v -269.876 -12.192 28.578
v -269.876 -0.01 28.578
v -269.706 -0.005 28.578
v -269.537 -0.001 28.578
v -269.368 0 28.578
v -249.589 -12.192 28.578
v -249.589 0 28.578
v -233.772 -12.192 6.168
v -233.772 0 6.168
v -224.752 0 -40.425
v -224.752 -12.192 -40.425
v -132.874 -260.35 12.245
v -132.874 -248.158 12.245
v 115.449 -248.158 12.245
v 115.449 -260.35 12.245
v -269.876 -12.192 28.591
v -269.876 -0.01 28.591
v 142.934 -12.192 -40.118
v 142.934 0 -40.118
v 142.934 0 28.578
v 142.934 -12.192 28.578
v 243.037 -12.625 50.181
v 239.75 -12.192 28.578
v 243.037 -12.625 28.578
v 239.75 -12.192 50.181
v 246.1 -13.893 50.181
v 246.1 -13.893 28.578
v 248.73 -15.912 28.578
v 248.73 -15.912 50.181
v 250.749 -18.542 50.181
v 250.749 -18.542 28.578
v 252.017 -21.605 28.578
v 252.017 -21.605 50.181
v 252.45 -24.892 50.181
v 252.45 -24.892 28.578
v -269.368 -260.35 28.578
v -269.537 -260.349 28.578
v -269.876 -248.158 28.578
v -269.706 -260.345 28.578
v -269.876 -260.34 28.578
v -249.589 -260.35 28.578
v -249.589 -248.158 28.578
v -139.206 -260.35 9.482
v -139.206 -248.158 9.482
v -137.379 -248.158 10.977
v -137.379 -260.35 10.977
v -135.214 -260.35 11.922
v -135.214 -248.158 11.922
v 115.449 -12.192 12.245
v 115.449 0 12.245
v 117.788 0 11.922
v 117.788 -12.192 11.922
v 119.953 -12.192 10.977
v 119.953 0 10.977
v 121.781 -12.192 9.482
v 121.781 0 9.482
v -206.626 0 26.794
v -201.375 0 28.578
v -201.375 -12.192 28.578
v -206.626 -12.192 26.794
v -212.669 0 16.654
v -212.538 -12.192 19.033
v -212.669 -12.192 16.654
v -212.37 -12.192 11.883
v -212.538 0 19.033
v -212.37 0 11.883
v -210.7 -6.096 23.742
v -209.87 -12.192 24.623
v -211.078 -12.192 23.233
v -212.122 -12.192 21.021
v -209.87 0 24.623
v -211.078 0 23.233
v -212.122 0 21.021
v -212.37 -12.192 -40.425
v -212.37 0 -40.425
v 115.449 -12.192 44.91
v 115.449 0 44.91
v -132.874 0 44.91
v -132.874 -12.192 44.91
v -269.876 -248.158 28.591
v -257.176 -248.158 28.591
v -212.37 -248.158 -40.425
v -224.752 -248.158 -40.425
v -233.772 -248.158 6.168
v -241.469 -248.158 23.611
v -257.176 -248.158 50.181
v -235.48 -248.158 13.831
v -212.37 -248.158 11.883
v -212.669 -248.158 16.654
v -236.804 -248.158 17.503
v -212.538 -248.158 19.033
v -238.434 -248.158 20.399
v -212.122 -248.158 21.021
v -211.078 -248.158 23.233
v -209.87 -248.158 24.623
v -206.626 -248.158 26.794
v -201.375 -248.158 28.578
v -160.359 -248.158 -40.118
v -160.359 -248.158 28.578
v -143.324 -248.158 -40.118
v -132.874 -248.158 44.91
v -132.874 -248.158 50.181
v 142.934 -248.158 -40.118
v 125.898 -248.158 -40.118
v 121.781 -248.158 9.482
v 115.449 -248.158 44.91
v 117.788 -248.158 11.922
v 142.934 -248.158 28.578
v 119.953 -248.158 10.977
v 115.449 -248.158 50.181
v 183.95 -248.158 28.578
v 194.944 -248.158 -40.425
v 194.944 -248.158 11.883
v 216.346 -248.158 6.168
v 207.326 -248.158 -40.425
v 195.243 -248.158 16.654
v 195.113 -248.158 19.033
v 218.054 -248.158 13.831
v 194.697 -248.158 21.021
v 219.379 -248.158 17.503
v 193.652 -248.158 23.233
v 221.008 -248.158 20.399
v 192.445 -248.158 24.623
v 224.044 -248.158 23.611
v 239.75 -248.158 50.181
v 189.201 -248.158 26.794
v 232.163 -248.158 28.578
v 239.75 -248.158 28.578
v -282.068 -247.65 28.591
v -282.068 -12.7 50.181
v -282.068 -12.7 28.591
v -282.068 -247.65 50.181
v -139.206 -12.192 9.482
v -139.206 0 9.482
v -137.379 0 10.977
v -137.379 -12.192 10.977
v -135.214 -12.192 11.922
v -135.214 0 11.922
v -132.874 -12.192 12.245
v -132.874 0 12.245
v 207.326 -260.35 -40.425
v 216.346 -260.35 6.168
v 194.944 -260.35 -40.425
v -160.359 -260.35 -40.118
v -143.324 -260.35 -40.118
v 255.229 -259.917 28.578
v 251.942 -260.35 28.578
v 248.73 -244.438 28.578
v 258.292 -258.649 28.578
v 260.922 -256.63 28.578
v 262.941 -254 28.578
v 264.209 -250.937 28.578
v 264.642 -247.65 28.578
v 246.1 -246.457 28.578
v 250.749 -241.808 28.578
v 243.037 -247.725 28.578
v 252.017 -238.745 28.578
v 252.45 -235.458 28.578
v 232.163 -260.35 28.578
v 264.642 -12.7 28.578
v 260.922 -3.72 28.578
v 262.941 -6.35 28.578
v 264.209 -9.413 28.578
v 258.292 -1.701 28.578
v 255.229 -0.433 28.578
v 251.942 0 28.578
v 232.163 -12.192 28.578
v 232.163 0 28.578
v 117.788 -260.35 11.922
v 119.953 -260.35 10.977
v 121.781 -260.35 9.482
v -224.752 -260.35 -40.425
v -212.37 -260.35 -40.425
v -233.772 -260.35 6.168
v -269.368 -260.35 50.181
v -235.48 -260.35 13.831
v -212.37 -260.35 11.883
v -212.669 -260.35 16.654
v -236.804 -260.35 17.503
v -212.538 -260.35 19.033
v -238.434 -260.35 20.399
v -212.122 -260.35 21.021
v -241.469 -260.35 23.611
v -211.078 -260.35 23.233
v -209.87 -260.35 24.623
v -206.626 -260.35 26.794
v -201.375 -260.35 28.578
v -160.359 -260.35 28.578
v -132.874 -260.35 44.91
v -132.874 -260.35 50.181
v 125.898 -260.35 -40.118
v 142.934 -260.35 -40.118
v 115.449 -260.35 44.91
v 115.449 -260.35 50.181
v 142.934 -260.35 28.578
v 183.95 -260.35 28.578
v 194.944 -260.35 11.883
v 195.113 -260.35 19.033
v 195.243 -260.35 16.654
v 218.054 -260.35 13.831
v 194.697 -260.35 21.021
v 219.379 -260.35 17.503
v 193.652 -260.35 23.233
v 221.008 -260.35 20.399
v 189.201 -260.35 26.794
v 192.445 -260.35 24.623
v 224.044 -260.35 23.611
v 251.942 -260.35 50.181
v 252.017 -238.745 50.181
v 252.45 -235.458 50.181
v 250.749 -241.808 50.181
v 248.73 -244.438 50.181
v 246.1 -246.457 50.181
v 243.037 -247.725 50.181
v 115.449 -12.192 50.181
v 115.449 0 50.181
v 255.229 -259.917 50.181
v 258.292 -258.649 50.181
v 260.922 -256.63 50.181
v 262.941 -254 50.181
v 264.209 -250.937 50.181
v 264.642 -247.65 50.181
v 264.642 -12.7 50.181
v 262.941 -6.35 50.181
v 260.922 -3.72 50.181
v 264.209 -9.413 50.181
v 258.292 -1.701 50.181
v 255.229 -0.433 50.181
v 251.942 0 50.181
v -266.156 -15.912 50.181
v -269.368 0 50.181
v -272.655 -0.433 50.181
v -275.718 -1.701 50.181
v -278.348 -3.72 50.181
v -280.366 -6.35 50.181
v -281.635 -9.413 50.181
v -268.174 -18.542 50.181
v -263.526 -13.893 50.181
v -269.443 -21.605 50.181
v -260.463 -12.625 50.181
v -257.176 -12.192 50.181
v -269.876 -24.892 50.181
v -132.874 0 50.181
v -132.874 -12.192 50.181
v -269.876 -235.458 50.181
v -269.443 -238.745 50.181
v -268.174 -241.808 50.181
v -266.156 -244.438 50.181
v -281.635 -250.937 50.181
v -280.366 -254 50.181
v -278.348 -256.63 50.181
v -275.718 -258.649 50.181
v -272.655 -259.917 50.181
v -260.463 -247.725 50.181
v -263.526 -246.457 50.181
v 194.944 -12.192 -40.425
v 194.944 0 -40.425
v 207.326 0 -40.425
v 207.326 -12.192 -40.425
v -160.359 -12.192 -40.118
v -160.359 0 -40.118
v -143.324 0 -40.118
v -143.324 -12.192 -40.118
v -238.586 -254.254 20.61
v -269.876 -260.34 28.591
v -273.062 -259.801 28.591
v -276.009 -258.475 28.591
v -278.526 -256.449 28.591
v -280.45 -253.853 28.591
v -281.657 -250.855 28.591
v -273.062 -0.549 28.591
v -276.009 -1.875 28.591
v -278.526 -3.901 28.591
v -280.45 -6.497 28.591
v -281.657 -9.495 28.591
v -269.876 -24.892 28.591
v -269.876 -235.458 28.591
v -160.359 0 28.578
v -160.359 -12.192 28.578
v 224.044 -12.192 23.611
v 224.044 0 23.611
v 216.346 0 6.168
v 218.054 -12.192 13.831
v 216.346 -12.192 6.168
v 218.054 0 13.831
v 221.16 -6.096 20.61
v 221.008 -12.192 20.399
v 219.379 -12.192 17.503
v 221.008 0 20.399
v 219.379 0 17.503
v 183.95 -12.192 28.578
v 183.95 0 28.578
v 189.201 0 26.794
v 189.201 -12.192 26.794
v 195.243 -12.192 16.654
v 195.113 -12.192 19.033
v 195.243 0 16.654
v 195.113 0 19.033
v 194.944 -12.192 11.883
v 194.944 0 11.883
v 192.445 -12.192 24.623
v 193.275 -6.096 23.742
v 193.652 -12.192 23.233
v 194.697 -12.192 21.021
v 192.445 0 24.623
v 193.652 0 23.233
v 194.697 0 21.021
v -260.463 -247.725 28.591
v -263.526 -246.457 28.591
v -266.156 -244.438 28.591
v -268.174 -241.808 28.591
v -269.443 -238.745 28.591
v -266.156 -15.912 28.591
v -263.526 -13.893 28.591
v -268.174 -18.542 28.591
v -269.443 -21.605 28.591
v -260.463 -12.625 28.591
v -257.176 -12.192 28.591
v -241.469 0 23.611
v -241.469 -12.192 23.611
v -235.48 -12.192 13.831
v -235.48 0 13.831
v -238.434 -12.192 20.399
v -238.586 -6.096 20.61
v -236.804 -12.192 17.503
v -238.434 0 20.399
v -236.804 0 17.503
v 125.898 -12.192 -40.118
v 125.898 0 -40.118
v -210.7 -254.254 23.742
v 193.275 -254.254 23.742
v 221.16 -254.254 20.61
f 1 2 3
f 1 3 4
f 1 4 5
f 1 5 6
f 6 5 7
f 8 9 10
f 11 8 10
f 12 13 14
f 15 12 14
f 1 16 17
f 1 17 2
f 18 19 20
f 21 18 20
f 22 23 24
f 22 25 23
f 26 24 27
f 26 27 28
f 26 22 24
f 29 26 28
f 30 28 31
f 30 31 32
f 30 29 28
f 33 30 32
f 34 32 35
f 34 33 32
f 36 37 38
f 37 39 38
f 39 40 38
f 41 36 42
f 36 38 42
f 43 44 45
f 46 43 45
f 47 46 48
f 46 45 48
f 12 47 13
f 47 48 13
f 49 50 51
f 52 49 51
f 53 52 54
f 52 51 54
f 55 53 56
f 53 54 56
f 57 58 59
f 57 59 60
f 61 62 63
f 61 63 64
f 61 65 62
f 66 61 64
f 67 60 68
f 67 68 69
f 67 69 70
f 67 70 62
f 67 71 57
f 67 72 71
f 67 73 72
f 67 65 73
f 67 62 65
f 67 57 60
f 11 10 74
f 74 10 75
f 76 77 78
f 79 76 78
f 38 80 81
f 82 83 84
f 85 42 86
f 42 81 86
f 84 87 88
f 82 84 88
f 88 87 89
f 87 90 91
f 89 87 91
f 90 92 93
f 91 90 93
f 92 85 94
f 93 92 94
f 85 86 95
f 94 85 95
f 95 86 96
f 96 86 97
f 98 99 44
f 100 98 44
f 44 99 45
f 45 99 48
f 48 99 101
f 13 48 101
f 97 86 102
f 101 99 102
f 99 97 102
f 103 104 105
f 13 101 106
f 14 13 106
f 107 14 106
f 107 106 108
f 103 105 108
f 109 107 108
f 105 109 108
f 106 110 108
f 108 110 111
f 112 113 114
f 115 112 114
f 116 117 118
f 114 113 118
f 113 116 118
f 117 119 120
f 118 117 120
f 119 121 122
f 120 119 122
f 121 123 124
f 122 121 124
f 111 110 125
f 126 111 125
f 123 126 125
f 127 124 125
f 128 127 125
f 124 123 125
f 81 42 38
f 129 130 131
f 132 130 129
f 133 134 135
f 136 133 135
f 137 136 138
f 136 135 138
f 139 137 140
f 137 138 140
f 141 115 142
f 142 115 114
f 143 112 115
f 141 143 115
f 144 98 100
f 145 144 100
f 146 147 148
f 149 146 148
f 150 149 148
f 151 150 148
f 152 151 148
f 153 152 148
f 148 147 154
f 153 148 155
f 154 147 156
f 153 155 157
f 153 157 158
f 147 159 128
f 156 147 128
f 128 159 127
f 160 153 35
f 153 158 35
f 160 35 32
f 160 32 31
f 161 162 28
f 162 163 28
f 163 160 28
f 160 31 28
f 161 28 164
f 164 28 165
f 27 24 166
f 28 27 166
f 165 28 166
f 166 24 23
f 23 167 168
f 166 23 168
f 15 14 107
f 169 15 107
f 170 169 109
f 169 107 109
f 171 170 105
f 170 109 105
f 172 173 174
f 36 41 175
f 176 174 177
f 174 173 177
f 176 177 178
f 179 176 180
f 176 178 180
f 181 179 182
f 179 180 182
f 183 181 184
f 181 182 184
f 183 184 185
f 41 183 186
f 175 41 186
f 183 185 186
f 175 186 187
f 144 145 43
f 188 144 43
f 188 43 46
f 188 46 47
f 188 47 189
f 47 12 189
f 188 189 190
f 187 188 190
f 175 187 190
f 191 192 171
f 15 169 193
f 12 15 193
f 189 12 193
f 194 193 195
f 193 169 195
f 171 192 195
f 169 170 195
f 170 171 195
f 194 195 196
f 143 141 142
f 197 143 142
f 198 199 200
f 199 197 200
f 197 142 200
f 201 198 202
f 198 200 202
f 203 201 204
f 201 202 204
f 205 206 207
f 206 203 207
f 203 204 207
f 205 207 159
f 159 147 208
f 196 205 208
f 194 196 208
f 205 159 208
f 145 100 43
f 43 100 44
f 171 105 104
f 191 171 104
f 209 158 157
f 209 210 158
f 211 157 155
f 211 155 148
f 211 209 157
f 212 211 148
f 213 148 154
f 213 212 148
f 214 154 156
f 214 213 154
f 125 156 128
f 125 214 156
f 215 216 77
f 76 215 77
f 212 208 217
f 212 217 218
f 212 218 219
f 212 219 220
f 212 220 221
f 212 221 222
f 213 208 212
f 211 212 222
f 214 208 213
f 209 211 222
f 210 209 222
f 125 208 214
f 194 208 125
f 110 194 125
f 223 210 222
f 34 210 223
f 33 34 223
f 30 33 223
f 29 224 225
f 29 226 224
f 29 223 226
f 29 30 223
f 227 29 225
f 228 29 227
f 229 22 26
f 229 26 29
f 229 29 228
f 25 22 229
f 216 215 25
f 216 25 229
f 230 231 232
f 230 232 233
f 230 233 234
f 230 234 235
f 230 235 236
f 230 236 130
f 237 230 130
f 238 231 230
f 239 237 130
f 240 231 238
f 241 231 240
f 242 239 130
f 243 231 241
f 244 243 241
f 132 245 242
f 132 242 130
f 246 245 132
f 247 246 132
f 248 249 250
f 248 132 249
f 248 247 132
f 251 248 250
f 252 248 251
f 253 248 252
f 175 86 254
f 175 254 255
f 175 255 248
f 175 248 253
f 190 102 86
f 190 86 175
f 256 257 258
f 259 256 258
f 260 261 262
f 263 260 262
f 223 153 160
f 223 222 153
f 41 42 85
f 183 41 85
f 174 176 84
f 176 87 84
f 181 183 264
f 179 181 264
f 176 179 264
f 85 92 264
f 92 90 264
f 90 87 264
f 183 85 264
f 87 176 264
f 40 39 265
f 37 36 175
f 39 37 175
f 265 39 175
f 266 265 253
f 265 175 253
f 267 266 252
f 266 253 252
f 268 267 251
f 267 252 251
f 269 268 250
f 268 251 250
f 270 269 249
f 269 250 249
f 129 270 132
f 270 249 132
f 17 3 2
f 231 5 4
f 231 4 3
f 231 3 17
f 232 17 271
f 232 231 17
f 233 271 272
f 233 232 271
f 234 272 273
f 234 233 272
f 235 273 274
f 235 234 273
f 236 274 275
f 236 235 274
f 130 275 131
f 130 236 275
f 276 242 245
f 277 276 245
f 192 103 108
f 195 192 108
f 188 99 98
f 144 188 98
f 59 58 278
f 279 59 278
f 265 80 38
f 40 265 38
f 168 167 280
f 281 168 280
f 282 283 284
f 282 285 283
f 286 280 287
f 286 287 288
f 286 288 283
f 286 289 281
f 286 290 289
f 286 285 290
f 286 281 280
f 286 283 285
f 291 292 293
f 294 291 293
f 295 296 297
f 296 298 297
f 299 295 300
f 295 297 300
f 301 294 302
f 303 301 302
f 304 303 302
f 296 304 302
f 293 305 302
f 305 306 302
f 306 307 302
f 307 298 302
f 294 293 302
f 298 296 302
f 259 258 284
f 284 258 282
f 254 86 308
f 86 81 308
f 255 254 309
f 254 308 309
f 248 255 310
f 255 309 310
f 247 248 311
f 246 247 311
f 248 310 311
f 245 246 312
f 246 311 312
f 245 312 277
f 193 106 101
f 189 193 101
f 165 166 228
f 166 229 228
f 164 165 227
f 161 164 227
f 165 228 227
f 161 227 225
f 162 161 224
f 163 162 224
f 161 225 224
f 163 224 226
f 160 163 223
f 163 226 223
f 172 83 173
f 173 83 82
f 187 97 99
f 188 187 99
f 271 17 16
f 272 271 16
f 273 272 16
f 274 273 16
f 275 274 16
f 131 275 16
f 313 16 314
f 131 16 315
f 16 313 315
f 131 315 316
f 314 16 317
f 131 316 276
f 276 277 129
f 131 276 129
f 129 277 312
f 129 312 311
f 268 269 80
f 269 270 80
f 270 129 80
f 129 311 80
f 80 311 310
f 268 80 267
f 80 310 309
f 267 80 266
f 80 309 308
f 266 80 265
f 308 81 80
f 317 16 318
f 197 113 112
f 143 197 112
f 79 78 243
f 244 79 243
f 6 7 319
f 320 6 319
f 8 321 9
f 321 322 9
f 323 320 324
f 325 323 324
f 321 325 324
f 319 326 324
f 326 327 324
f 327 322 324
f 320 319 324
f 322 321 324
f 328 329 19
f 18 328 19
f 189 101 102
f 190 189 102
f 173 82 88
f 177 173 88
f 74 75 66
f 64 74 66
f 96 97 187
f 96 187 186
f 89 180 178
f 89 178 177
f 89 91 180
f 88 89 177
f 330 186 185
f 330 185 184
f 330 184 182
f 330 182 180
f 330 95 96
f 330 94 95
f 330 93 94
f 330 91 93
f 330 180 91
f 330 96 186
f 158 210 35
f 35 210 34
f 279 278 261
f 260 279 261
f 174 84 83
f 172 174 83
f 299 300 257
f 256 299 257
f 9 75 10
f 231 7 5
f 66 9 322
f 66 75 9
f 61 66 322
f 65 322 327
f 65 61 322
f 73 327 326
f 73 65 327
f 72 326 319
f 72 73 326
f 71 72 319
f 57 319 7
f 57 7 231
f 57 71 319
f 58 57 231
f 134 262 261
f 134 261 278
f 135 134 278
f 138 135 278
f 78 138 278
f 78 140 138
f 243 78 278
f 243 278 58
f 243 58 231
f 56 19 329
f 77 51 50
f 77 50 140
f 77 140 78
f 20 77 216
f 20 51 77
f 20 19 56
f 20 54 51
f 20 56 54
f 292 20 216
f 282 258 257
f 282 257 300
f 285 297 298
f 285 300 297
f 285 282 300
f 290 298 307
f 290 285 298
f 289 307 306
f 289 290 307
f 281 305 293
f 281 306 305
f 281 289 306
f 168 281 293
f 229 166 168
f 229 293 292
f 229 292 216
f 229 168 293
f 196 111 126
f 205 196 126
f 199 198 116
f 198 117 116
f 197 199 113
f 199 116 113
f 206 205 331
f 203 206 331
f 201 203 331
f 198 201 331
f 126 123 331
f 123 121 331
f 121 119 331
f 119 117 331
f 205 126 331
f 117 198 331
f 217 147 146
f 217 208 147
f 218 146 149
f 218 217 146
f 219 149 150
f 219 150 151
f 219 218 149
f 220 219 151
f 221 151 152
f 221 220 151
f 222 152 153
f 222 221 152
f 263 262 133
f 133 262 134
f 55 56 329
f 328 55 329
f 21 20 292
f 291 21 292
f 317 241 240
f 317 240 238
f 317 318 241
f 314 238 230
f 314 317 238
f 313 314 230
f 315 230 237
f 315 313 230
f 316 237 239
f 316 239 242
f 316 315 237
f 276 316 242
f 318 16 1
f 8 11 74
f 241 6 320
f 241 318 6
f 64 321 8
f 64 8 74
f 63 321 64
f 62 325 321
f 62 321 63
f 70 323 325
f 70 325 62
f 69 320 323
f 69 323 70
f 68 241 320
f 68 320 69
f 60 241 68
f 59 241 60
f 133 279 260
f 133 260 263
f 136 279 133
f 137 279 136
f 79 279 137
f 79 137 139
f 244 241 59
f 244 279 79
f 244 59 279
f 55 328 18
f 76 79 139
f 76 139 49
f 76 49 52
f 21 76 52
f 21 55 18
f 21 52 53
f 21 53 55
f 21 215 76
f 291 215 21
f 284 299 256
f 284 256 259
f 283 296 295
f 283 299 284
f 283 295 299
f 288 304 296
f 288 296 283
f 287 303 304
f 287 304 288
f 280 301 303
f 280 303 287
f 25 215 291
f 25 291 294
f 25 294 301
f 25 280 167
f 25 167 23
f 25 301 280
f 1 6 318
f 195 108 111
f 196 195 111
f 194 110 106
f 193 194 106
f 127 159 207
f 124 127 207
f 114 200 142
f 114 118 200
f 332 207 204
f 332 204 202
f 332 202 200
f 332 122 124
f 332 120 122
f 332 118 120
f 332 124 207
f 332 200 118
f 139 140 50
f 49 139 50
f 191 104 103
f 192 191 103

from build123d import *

# Parameters (mm, degrees)
F1_DEPTH = 12.192
F3_W     = 260.35
F3_H     = 21.6032387971
F4_DEPTH = 12.192
F5_W     = 260.35
F5_H     = 21.59
F6_DEPTH = 12.192
F7_R     = 12.7


with BuildPart() as f1:
    # F0 (on Front) → F1 (new body)
    with BuildSketch(Plane.XZ):
        Polygon((115.4489097687, 44.9104134451), (-8.7127741426, 44.9104134451), (-8.7127741426, 12.2448502547), (115.4489097687, 12.2448502547), (115.4489097687, 28.5776318499), align=None)
        with BuildLine():
            add(Edge.make_bspline(
                [(-201.3751125628, 28.5776318499), (-203.6036875056, 28.2155507261), (-213.5160050083, 24.8398299044), (-212.7768922816, 16.2961456434), (-212.3699930733, 11.8833564186)],
                knots=[0.1713367735, 0.1713367735, 0.1713367735, 0.1713367735, 0.5720981619, 1, 1, 1, 1], degree=3))
            Line((-201.3751125628, 28.5776318499), (-249.5887362649, 28.5776318499))
            add(Edge.make_bspline(
                [(-249.5887362649, 28.5776318499), (-245.3983662499, 26.3811930315), (-236.7722226078, 21.8596837899), (-234.7906912251, 11.49704289), (-233.7717394185, 6.1683199847)],
                knots=[0, 0, 0, 0, 0.4857755898, 1, 1, 1, 1], degree=3))
            Line((-233.7717394185, 6.1683199847), (-224.7518429065, -40.4246754655))
            Line((-224.7518429065, -40.4246754655), (-212.3699930733, -40.4246754655))
            Line((-212.3699930733, -40.4246754655), (-212.3699930733, 11.8833564186))
        make_face()
        with BuildLine():
            add(Edge.make_bspline(
                [(232.1631879797, 28.5776318499), (227.9728179646, 26.3811930315), (219.3466743226, 21.8596837899), (217.3651429399, 11.49704289), (216.3461911332, 6.1683199847)],
                knots=[0, 0, 0, 0, 0.4857755898, 1, 1, 1, 1], degree=3))
            Line((232.1631879797, 28.5776318499), (183.9495642776, 28.5776318499))
            add(Edge.make_bspline(
                [(183.9495642776, 28.5776318499), (186.1781392203, 28.2155507261), (196.0904567231, 24.8398299044), (195.3513439963, 16.2961456434), (194.944444788, 11.8833564186)],
                knots=[0.1713367735, 0.1713367735, 0.1713367735, 0.1713367735, 0.5720981619, 1, 1, 1, 1], degree=3))
            Line((194.944444788, 11.8833564186), (194.944444788, -40.4246754655))
            Line((194.944444788, -40.4246754655), (207.3262946213, -40.4246754655))
            Line((207.3262946213, -40.4246754655), (216.3461911332, 6.1683199847))
        make_face()
        with BuildLine():
            Line((-132.874458054, 12.2448502547), (-132.874458054, 28.5776318499))
            Line((-132.874458054, 28.5776318499), (-160.3592138582, 28.5776318499))
            Line((-160.3592138582, 28.5776318499), (-160.3592138582, -40.1182342476))
            Line((-160.3592138582, -40.1182342476), (-143.3239786863, -40.1182342476))
            Line((-143.3239786863, -40.1182342476), (-139.2062762381, 9.481767078))
            ThreePointArc((-139.2062762381, 9.481767078), (-136.3286783046, 11.5239959202), (-132.874458054, 12.2448502547))
        make_face()
        with BuildLine():
            Line((115.4489097687, 28.5776318499), (115.4489097687, 12.2448502547))
            ThreePointArc((115.4489097687, 12.2448502547), (118.9031300193, 11.5239959202), (121.7807279529, 9.481767078))
            Line((121.7807279529, 9.481767078), (125.898430401, -40.1182342476))
            Line((125.898430401, -40.1182342476), (142.933665573, -40.1182342476))
            Line((142.933665573, -40.1182342476), (142.933665573, 28.5776318499))
            Line((142.933665573, 28.5776318499), (115.4489097687, 28.5776318499))
        make_face()
        with BuildLine():
            Line((115.4489097687, 50.180870647), (115.4489097687, 44.9104134451))
            Line((115.4489097687, 44.9104134451), (115.4489097687, 28.5776318499))
            Line((115.4489097687, 28.5776318499), (142.933665573, 28.5776318499))
            Line((142.933665573, 28.5776318499), (182.0295738914, 28.5776318499))
            add(Edge.make_bspline(
                [(182.0295738914, 28.5776318499), (182.5128861487, 28.6550095059), (182.9967857635, 28.7324317216), (183.9495642776, 28.5776318499)],
                knots=[0, 0, 0, 0, 0.1713367735, 0.1713367735, 0.1713367735, 0.1713367735], degree=3))
            Line((183.9495642776, 28.5776318499), (232.1631879797, 28.5776318499))
            Line((232.1631879797, 28.5776318499), (252.4502187865, 28.5776318499))
            Line((252.4502187865, 28.5776318499), (252.4502187865, 50.180870647))
            Line((252.4502187865, 50.180870647), (115.4489097687, 50.180870647))
        make_face()
        Polygon((-8.7127741426, 44.9104134451), (-132.874458054, 44.9104134451), (-132.874458054, 28.5776318499), (-132.874458054, 12.2448502547), (-8.7127741426, 12.2448502547), align=None)
        with BuildLine():
            Line((-132.874458054, 28.5776318499), (-132.874458054, 44.9104134451))
            Line((-132.874458054, 44.9104134451), (-132.874458054, 50.180870647))
            Line((-132.874458054, 50.180870647), (-269.8757670717, 50.180870647))
            Line((-269.8757670717, 50.180870647), (-269.8757670717, 28.5776318499))
            Line((-269.8757670717, 28.5776318499), (-249.5887362649, 28.5776318499))
            Line((-249.5887362649, 28.5776318499), (-201.3751125628, 28.5776318499))
            add(Edge.make_bspline(
                [(-199.4551221767, 28.5776318499), (-199.9384344339, 28.6550095059), (-200.4223340487, 28.7324317216), (-201.3751125628, 28.5776318499)],
                knots=[0, 0, 0, 0, 0.1713367735, 0.1713367735, 0.1713367735, 0.1713367735], degree=3))
            Line((-199.4551221767, 28.5776318499), (-160.3592138582, 28.5776318499))
            Line((-160.3592138582, 28.5776318499), (-132.874458054, 28.5776318499))
        make_face()
        with BuildLine():
            add(Edge.make_bspline(
                [(182.0295738914, 28.5776318499), (182.5128861487, 28.6550095059), (182.9967857635, 28.7324317216), (183.9495642776, 28.5776318499)],
                knots=[0, 0, 0, 0, 0.1713367735, 0.1713367735, 0.1713367735, 0.1713367735], degree=3))
            Line((182.0295738914, 28.5776318499), (183.9495642776, 28.5776318499))
        make_face()
        with BuildLine():
            Line((-201.3751125628, 28.5776318499), (-199.4551221767, 28.5776318499))
            add(Edge.make_bspline(
                [(-199.4551221767, 28.5776318499), (-199.9384344339, 28.6550095059), (-200.4223340487, 28.7324317216), (-201.3751125628, 28.5776318499)],
                knots=[0, 0, 0, 0, 0.1713367735, 0.1713367735, 0.1713367735, 0.1713367735], degree=3))
        make_face()
    extrude(amount=F1_DEPTH)


with BuildPart() as f2_1:
    # F2: copy of F1
    add(f1.part.moved(Location((0, -248.158, 0))))


with BuildPart() as f1_1:
    add(f1.part)

    add(f2_1.part)  # F4 merges F2_1
    # F3 (on face) → F4 (join)
    with BuildSketch(Plane.YZ.offset(252.4502187865)):
        with Locations((-130.175, 39.3792512485)):
            Rectangle(F3_W, F3_H)
    extrude(amount=F4_DEPTH)

    # F5 (on face) → F6 (join)
    with BuildSketch(Plane(origin=(-269.8757670717, 0, 0), x_dir=(0, -1, 0), z_dir=(-1, 0, 0))):
        with Locations((130.175, 39.385870647)):
            Rectangle(F5_W, F5_H)
    extrude(amount=F6_DEPTH)

    # F7
    f7_edges = [f1_1.edges().sort_by_distance(p)[0] for p in [
        (264.642219, -260.35, 39.379251),
        (264.642219, 0, 39.379251),
        (-282.067767, 0, 39.385871),
        (-282.067767, -260.35, 39.385871),
        (252.450219, -12.192, 39.379251),
        (252.450219, -248.158, 39.379251),
        (-269.875767, -248.158, 39.385871),
        (-269.875767, -12.192, 39.385871),
    ]]
    fillet(f7_edges, radius=F7_R)


solid = f1_1.part
